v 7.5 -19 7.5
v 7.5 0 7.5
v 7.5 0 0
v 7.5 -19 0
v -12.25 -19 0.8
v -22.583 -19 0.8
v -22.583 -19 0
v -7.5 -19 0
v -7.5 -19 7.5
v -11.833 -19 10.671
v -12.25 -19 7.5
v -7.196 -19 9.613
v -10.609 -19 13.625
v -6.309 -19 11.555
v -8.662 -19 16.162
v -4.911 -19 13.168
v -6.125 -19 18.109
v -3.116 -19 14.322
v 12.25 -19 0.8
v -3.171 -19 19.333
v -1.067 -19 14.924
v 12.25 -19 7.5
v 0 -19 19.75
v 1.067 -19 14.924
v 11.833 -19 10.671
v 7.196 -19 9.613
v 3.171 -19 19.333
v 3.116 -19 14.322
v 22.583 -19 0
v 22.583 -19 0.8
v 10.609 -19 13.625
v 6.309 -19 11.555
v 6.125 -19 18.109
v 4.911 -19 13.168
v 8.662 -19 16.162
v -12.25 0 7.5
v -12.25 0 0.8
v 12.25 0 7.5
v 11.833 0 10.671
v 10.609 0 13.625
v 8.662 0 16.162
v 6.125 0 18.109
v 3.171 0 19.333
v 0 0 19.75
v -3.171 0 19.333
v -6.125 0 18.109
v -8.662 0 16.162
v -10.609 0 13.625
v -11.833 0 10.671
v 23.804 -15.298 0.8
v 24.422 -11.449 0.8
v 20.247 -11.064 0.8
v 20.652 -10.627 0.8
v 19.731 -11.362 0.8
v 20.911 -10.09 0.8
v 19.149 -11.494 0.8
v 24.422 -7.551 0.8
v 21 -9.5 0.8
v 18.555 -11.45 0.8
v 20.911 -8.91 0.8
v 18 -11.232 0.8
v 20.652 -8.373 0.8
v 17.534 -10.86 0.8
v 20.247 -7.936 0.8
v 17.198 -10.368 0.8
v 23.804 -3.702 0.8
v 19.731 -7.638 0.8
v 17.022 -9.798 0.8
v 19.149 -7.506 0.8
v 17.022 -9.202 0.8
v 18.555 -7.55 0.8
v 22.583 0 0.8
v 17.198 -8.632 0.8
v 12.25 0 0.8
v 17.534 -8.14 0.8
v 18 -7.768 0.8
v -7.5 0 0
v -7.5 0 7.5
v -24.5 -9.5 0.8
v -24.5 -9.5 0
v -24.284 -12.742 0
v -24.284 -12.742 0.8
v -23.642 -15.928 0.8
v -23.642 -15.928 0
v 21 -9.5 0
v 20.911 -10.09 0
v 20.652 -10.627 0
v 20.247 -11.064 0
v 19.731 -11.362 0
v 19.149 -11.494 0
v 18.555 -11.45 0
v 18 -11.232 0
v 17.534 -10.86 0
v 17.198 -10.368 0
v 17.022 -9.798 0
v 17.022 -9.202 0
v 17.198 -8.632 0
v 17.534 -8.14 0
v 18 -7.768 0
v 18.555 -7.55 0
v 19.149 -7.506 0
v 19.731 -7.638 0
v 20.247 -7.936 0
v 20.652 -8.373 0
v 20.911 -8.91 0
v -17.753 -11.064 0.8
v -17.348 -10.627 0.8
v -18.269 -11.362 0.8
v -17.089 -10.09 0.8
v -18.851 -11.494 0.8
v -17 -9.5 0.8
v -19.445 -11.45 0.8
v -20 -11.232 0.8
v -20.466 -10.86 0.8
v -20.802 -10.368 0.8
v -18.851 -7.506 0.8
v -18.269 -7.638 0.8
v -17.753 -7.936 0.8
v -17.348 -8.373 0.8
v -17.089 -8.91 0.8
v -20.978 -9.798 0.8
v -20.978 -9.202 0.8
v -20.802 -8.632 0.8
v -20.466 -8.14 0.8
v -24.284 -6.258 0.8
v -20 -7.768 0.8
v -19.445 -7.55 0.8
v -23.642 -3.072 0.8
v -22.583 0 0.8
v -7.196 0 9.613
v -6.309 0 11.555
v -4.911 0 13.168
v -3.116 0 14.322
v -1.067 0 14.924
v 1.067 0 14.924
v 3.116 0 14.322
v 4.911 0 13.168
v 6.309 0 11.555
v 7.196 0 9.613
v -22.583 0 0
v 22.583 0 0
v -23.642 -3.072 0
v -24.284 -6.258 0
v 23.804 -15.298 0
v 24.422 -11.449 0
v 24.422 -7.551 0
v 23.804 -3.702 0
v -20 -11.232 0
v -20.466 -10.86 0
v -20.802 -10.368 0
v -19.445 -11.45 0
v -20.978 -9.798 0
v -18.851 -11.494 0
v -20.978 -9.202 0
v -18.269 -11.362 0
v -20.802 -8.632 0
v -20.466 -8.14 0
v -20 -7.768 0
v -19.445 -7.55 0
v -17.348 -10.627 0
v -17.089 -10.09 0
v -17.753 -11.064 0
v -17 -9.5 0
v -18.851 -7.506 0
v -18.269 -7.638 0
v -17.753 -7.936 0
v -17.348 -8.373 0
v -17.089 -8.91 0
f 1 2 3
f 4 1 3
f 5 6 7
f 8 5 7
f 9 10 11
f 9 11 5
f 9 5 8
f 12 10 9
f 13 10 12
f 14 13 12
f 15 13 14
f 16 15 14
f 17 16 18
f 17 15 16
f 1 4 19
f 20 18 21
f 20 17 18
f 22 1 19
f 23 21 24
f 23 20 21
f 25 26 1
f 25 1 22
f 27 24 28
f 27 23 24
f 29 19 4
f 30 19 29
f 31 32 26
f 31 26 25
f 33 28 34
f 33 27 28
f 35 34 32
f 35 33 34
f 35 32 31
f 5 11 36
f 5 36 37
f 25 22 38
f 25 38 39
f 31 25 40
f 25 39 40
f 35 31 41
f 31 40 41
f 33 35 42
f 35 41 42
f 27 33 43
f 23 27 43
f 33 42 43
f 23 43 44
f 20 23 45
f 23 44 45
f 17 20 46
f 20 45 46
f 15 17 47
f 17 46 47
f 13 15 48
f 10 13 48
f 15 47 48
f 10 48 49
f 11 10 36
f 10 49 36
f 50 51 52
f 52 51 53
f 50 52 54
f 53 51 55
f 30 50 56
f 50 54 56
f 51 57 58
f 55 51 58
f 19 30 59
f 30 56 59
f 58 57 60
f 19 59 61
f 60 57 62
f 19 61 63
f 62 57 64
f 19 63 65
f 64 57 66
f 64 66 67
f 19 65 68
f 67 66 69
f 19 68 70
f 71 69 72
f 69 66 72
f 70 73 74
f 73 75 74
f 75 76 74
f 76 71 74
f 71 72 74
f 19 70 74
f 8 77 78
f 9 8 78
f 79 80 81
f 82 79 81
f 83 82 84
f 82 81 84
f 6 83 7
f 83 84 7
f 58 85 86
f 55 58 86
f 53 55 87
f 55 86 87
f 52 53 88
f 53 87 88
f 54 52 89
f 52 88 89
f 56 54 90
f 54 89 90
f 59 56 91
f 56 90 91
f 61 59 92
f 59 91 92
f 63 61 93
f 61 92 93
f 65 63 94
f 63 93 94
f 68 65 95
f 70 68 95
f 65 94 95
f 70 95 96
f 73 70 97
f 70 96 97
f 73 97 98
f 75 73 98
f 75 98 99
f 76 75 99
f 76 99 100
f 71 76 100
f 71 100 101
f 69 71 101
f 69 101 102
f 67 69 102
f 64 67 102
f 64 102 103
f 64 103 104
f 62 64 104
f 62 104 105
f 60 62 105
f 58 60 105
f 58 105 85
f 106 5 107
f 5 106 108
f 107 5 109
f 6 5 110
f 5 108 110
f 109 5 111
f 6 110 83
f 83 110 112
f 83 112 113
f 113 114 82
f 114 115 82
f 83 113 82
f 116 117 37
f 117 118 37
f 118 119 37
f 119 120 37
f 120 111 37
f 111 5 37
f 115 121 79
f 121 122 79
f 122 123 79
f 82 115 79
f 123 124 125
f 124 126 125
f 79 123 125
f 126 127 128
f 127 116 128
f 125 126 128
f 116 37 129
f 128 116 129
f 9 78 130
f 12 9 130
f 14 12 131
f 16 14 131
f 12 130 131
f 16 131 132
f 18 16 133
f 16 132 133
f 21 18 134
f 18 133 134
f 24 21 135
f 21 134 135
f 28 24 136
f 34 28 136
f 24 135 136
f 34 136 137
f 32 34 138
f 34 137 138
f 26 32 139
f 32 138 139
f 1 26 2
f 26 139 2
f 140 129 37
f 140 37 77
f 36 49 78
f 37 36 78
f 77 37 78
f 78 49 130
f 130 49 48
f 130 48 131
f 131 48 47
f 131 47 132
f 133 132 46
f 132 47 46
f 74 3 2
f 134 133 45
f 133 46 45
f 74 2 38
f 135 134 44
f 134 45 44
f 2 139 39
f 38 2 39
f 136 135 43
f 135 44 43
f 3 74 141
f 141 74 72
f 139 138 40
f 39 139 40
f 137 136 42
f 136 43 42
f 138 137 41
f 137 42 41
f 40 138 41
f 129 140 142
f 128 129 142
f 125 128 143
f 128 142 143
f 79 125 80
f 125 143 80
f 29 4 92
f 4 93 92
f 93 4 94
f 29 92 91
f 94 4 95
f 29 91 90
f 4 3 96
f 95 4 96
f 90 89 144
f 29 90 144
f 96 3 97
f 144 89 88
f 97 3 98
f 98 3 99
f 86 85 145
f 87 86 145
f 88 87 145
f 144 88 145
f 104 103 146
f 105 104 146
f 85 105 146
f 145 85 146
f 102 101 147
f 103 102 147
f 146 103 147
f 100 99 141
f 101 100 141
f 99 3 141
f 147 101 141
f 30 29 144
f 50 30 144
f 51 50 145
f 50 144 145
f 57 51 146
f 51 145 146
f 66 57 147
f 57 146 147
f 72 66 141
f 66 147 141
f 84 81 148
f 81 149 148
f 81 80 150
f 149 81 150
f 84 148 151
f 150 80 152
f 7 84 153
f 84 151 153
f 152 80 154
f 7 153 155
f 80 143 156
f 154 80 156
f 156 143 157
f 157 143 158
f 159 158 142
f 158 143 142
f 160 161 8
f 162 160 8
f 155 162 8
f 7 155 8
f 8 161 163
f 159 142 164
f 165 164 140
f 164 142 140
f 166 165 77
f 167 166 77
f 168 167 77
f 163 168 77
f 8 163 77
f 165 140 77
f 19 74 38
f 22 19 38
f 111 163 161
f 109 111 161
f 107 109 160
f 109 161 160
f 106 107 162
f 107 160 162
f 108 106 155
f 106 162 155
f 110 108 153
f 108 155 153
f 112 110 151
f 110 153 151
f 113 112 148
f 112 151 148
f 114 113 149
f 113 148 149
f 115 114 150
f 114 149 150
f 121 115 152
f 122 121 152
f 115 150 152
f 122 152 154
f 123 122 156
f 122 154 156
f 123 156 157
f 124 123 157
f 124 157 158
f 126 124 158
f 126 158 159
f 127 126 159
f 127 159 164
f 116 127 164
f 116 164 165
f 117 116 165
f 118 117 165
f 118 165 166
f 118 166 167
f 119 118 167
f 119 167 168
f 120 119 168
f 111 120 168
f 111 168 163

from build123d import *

# Parameters (mm, degrees)
F1_DEPTH = 19
F2_R     = 2
F3_DEPTH = 25


with BuildPart() as f1:
    # F0 (on Front) → F1 (new body)
    with BuildSketch(Plane.XZ):
        with BuildLine():
            ThreePointArc((-7.5, 7.5), (0, 15), (7.5, 7.5))
            Line((7.5, 7.5), (7.5, 0))
            Line((7.5, 0), (24.5, 0))
            Line((24.5, 0), (24.5, 0.8))
            Line((24.5, 0.8), (12.25, 0.8))
            Line((12.25, 0.8), (12.25, 7.5))
            ThreePointArc((12.25, 7.5), (0, 19.75), (-12.25, 7.5))
            Line((-12.25, 7.5), (-12.25, 0.8))
            Line((-12.25, 0.8), (-24.5, 0.8))
            Line((-24.5, 0.8), (-24.5, 0))
            Line((-24.5, 0), (-7.5, 0))
            Line((-7.5, 0), (-7.5, 7.5))
        make_face()
    extrude(amount=F1_DEPTH)

    # F2 (on face) → F3 (cut)
    with BuildSketch(Plane(origin=(0, 0, 0), x_dir=(1, 0, 0), z_dir=(0, 0, -1))):
        with Locations((-19, 9.5)):
            Circle(F2_R)
        with Locations((19, 9.5)):
            Circle(F2_R)
        with BuildLine():
            ThreePointArc((-22.58318, 0), (-24.016014, 4.654275), (-24.5, 9.5))
            Line((-24.5, 9.5), (-24.5, 0))
            Line((-24.5, 0), (-22.58318, 0))
        make_face()
        with BuildLine():
            ThreePointArc((-24.5, 9.5), (-24.016014, 14.345725), (-22.58318, 19))
            Line((-22.58318, 19), (-24.5, 19))
            Line((-24.5, 19), (-24.5, 9.5))
        make_face()
        with BuildLine():
            ThreePointArc((22.58318, 19), (24.5, 9.5), (22.58318, 0))
            Line((22.58318, 0), (24.50018, 0))
            Line((24.50018, 0), (24.50018, 19))
            Line((24.50018, 19), (22.58318, 19))
        make_face()
    extrude(amount=-F3_DEPTH, mode=Mode.SUBTRACT)


solid = f1.part
